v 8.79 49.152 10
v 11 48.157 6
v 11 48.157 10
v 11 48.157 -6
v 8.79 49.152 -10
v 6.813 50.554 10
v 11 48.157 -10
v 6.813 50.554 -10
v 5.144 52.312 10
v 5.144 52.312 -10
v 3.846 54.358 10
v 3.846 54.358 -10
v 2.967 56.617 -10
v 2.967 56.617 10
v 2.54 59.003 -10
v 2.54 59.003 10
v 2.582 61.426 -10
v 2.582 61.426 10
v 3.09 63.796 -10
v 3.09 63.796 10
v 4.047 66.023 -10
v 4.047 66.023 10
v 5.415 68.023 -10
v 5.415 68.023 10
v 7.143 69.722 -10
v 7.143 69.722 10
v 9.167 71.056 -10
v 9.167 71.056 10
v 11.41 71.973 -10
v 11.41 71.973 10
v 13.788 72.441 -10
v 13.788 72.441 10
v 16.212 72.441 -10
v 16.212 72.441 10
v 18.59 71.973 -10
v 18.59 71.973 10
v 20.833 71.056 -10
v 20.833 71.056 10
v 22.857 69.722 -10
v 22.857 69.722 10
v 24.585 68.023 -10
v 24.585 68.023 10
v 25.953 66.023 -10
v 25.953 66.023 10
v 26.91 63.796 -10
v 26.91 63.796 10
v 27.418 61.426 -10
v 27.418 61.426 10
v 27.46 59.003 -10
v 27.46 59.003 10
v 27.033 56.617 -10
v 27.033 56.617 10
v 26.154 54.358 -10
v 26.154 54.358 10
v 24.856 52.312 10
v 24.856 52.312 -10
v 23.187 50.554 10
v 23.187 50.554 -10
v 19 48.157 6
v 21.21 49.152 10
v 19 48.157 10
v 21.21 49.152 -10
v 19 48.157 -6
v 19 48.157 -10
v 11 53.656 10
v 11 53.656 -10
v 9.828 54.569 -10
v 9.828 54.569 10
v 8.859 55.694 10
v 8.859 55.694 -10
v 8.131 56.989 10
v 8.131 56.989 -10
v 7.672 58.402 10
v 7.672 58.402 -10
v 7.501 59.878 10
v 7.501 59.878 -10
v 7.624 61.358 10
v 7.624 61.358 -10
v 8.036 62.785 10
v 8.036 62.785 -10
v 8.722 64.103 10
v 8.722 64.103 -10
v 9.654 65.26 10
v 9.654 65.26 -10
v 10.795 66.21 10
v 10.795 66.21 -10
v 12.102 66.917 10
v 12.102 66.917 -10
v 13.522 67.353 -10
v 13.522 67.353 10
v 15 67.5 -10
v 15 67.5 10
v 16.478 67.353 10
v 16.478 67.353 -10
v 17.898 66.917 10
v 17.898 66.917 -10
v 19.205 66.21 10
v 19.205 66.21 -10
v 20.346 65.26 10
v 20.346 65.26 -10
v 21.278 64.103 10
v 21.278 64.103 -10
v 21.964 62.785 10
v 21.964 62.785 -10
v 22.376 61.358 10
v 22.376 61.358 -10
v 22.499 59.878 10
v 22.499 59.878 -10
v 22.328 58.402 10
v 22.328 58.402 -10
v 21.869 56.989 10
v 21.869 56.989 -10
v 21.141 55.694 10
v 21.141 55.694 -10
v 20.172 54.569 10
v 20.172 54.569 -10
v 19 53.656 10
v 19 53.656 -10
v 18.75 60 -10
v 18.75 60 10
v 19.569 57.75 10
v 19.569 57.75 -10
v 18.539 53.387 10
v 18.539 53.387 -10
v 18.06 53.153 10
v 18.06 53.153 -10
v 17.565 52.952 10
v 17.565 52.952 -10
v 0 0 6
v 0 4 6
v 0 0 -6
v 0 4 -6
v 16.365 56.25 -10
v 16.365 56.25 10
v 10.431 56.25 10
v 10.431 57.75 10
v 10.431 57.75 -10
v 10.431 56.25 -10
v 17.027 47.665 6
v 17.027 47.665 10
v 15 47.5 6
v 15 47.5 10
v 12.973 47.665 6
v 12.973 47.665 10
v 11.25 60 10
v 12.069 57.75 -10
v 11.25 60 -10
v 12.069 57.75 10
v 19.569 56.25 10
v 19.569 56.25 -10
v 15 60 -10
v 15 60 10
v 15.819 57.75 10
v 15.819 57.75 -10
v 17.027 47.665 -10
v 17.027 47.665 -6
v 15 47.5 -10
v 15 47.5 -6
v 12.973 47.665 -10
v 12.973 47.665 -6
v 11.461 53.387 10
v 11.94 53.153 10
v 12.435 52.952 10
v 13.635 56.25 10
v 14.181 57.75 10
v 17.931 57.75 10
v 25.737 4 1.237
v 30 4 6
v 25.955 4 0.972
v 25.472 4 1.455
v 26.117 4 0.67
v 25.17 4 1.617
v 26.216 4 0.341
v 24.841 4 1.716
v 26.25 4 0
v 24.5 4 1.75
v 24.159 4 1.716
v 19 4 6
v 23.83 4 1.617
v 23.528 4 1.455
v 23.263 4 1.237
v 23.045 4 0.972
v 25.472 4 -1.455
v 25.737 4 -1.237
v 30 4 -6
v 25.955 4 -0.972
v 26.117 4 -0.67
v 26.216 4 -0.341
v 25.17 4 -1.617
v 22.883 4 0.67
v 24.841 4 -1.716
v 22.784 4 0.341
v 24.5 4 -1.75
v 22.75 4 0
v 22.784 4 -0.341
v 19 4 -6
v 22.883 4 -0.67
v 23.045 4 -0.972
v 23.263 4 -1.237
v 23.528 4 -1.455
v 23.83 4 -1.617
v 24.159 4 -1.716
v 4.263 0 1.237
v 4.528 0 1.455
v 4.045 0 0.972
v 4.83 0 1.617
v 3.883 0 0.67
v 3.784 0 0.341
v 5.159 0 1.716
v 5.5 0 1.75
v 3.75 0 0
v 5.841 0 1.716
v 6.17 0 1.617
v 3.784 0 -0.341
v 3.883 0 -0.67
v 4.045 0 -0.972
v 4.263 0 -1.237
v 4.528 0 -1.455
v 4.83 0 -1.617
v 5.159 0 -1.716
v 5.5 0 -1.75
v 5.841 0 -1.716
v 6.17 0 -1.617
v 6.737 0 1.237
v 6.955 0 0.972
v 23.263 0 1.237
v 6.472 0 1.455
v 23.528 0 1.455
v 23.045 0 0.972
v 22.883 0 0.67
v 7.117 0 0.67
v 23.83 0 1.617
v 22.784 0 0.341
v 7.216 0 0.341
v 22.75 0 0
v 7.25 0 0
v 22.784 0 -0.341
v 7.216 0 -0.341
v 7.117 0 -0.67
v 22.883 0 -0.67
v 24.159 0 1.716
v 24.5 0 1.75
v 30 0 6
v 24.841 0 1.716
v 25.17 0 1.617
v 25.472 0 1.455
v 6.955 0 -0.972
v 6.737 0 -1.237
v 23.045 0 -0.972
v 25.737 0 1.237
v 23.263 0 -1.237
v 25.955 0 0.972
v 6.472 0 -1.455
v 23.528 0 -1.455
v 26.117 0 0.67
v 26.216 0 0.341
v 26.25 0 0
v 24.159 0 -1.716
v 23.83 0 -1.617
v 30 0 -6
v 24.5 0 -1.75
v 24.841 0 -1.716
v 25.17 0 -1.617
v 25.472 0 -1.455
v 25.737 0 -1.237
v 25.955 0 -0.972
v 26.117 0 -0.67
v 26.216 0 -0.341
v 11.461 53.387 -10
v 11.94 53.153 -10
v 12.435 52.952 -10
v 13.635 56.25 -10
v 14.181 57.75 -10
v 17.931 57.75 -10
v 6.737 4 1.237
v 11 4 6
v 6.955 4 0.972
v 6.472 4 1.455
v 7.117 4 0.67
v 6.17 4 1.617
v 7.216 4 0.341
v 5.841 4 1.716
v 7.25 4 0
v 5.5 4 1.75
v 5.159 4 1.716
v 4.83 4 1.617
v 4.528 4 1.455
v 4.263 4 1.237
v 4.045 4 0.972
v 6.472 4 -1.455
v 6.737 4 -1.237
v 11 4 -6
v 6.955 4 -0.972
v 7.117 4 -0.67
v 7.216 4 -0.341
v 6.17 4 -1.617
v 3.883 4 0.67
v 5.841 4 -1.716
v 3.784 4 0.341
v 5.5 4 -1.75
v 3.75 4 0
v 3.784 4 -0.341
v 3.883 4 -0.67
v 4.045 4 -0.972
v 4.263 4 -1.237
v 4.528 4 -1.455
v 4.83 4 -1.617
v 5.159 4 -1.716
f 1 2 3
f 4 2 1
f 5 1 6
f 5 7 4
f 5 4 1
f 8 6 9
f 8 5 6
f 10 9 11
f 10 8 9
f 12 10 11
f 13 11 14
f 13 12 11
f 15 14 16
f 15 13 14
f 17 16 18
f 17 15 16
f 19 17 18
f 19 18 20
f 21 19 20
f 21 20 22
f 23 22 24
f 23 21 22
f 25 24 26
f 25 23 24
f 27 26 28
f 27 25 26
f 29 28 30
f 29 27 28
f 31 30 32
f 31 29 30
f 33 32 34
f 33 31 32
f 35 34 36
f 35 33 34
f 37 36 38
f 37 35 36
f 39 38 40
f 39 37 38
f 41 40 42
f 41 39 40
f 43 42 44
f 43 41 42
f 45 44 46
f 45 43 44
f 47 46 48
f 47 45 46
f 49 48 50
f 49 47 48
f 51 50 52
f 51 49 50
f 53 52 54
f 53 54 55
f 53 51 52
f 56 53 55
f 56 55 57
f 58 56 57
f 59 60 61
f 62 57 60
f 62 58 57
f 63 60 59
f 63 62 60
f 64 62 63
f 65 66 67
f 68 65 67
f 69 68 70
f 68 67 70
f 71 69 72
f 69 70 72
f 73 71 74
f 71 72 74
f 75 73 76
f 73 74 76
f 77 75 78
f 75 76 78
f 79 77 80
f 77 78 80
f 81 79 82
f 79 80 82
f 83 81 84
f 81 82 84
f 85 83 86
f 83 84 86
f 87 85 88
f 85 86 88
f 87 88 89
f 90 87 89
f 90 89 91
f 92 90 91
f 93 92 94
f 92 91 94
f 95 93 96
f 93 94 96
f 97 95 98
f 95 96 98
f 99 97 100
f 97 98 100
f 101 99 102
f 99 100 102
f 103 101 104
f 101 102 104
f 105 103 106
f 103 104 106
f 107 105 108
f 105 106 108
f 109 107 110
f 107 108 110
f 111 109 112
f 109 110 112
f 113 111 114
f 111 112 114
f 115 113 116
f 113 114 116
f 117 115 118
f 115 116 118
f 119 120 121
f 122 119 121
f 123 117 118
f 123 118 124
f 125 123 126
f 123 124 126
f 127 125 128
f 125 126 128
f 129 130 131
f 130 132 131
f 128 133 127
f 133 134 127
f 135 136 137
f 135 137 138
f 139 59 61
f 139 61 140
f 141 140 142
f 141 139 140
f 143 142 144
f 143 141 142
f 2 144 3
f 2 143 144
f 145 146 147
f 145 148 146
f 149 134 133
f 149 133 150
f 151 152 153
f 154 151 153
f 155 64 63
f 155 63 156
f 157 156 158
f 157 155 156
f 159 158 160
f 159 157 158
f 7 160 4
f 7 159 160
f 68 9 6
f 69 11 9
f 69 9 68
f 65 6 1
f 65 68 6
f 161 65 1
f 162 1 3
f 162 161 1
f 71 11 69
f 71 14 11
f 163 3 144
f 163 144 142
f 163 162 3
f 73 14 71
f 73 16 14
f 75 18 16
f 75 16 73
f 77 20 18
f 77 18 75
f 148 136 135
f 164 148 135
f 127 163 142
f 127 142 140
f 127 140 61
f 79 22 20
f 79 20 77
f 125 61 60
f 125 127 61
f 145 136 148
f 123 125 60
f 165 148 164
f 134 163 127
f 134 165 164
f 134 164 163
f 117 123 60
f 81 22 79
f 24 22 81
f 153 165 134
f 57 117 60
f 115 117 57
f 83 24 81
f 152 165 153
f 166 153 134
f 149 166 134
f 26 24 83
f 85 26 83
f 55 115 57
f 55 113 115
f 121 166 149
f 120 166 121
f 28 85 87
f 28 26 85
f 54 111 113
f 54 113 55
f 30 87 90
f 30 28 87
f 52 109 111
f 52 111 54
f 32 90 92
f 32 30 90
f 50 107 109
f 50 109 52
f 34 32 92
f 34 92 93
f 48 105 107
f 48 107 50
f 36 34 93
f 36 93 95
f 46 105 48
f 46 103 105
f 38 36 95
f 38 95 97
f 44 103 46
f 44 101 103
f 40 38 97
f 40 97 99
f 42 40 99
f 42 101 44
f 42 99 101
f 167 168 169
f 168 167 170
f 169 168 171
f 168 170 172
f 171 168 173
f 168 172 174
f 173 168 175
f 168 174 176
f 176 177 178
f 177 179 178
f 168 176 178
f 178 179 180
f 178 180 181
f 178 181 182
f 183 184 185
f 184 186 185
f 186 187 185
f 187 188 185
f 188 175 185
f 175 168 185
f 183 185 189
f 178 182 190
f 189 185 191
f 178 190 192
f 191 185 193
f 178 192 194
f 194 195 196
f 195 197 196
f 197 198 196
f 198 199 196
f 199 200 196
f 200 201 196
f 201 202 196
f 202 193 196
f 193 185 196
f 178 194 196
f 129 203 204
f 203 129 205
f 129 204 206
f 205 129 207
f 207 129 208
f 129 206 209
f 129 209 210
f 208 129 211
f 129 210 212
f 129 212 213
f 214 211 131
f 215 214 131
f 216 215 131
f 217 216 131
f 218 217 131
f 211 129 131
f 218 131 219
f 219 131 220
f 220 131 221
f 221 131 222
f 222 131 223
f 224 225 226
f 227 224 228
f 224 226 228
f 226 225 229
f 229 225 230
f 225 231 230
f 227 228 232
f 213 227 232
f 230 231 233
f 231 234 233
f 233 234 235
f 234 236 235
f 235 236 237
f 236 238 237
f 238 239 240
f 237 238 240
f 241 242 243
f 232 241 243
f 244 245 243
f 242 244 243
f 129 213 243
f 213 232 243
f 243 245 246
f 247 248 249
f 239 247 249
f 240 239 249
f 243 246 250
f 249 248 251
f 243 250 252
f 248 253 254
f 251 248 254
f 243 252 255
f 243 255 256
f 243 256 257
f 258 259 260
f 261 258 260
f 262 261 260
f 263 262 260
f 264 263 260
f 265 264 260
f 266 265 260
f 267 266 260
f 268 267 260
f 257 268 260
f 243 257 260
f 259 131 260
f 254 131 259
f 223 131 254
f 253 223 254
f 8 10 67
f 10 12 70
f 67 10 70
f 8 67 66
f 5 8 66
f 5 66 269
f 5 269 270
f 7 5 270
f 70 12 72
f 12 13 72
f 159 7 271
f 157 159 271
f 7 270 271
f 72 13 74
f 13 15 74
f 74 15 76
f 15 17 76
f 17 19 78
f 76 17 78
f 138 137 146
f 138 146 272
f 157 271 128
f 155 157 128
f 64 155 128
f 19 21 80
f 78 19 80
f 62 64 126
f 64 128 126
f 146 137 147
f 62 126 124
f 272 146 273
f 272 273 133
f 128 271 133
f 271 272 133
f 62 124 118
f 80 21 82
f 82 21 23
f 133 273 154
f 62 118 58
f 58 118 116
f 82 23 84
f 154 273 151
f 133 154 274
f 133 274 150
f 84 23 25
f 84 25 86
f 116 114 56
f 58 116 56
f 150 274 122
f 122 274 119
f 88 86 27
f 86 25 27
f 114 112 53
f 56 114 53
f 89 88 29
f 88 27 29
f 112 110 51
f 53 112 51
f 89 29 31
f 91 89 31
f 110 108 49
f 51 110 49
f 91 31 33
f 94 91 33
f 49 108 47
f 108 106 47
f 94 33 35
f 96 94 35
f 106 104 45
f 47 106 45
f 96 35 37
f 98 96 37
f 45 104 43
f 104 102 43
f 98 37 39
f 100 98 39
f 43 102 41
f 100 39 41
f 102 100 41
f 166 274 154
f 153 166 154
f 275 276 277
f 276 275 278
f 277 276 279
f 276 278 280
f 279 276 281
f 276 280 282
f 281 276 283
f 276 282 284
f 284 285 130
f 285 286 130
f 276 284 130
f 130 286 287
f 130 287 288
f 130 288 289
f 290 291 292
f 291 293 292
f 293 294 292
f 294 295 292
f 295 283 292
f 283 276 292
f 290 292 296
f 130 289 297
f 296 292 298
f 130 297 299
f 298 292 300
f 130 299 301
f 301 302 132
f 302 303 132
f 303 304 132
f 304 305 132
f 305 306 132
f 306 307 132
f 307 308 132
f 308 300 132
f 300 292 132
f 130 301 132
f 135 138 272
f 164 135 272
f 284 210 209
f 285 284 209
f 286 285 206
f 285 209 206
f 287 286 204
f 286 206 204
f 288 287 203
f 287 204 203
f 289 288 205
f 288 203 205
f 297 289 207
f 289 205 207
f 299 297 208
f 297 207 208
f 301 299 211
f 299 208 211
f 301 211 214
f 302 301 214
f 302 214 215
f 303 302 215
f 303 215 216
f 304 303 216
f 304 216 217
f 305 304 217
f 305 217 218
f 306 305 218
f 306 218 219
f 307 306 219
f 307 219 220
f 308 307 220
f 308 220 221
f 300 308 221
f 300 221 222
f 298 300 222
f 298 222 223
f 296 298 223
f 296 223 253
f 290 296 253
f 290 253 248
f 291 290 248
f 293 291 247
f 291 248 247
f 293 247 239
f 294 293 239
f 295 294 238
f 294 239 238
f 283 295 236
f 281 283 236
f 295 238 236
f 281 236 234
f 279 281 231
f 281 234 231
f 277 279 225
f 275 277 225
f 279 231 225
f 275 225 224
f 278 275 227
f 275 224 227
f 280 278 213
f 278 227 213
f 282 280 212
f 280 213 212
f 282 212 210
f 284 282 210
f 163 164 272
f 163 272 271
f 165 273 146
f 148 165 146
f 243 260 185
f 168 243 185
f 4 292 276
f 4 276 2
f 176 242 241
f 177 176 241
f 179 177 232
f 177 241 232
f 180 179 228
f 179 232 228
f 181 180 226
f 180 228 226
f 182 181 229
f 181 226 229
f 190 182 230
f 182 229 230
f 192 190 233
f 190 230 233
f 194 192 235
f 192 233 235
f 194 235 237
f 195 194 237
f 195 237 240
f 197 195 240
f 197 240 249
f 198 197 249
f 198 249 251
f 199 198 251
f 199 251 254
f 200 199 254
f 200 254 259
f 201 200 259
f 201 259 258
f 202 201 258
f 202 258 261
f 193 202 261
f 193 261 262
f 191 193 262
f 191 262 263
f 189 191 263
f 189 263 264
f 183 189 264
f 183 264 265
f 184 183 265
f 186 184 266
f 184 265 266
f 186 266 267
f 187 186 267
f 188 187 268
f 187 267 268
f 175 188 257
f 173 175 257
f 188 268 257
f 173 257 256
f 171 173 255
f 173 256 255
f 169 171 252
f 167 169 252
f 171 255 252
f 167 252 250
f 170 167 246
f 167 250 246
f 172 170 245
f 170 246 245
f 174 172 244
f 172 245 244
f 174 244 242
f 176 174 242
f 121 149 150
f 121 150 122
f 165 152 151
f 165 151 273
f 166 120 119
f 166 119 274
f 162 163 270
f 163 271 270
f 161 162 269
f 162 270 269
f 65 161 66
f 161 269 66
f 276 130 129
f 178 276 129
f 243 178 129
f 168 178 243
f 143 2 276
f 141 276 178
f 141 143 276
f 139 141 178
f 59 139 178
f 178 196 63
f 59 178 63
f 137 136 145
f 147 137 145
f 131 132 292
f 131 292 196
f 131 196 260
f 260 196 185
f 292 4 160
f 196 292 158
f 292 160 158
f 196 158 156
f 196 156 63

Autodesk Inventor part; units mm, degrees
ref_plane "YZ Plane" through (0, 0, 0) normal (1, 0, 0) x (0, 1, 0)
ref_plane "XZ Plane" through (0, 0, 0) normal (0, 1, 0) x (-1, 0, 0)
ref_plane "XY Plane" through (0, 0, 0) normal (0, 0, 1) x (1, 0, 0)
sketch "Sketch1" plane through (0, 0, 0) normal (0, 0, 1) x (1, 0, 0)
  line L0 (0, 0) -> (30, 0)
  line L1 (30, 0) -> (30, 4)
  line L2 (30, 4) -> (0, 4)
  line L3 (0, 4) -> (0, 0)
  line L4 (15, 4) -> (11, 4)
  line L5 (15, 4) -> (19, 4)
  line L6 (11, 4) -> (11, 60)
  line L7 (19, 4) -> (19, 60)
  line L8 (11, 60) -> (19, 60)
  circle A0 centre (15, 60) radius 7.5
  circle A1 centre (15, 60) radius 12.5
  arc A2 (11, 48.1573) -> (19, 48.1573) centre (15, 60) ccw
  arc A3 (11, 53.6557) -> (19, 53.6557) centre (15, 60) ccw
  dimension "d0" = 30
  dimension "d1" = 4
  dimension "d2" = 4
  dimension "d3" = 4
  dimension "d5" = 60
  dimension "d6" = 15
  dimension "d7" = 25
extrude "Extrusion1" add sketch "Sketch1" along normal mid plane 12 contours L3 L2 L1 L0 | L6 A1 L7 L2
extrude "Extrusion2" add sketch "Sketch1" along normal mid plane 20 contours A1 L7 A0 L6 | L6 A0 L7 A1
sketch "Sketch2" plane through (19, 4, 6) normal (0, 1, 0) x (1, 0, 0)
  line L0 (0, 12) -> (0, 0) projected
  line L1 (11, 0) -> (0, 0) projected
  line L2 (11, 12) -> (11, 0) projected
  line L3 (0, 12) -> (11, 12) projected
  line L4 (0, 6) -> (11, 6)
  point P0 (-19, 6)
  point P1 (5.5, 6)
hole "Hole1" at (24.5, 4, 0) direction (0, -1, 0) diameter 3.5 end up to surface
ref_plane "Work Plane1" through (15, 4, -6) normal (-1, 0, 0) x (0, 0, 1)
mirror "Mirror1" about plane through (15, 4, -6) normal (-1, 0, 0) of "Hole1"
sketch "Sketch3" plane through (15, 60, 10) normal (0, 0, 1) x (1, 0, 0)
  circle A0 centre (0, 0) radius 7.5 projected
  line L0 (0, 0) -> (2.5652, -7.0477)
  line L1 (0, 0) -> (-2.5652, -7.0477)
  line L2 (0, -74.5) -> (0, 27) projected
  line L3 (0, -7.5) -> (0, -2.25)
  line L4 (0, 0) -> (-7.5, 0)
  line L5 (7.5, 0) -> (0, 0)
  line L6 (3.75, 0) -> (4.5689, -2.25)
  line L7 (0, -3.75) -> (4.5689, -3.75)
  line L8 (4.5689, -3.75) -> (4.5689, -2.25)
  line L9 (2.9311, -2.25) -> (0, -2.25)
  line L10 (0, -2.25) -> (0, -3.75)
  line L11 (3.75, 0) -> (2.9311, -2.25)
  arc A1 (-2.5652, -7.0477) -> (2.5652, -7.0477) centre (0, 0) ccw
  point P0 (-15, -60)
  point P1 (-3.75, 0)
  dimension "d19" = 20
  dimension "d20" = 20
  dimension "d21" = 70
  dimension "d22" = 1.5
  dimension "d23" = 70
  dimension "d24" = 4.5689
  dimension "d25" = 2.9311
extrude "Extrusion3" add sketch "Sketch3" against normal up to surface (20 mm away) contours L1 L2 A0 | L0 L9 L2 | L2 L7 L0 A0 | L9 L11 L6 L8 L7 L0 | L0 L7 L2 L9
mirror "Mirror2" about plane through (15, 4, -6) normal (-1, 0, 0) of "Extrusion3"
equation "\"d2\" = d3"
equation "\"d20\" = d19"
equation "\"d23\" = d21"
properties part number "frontSight"
